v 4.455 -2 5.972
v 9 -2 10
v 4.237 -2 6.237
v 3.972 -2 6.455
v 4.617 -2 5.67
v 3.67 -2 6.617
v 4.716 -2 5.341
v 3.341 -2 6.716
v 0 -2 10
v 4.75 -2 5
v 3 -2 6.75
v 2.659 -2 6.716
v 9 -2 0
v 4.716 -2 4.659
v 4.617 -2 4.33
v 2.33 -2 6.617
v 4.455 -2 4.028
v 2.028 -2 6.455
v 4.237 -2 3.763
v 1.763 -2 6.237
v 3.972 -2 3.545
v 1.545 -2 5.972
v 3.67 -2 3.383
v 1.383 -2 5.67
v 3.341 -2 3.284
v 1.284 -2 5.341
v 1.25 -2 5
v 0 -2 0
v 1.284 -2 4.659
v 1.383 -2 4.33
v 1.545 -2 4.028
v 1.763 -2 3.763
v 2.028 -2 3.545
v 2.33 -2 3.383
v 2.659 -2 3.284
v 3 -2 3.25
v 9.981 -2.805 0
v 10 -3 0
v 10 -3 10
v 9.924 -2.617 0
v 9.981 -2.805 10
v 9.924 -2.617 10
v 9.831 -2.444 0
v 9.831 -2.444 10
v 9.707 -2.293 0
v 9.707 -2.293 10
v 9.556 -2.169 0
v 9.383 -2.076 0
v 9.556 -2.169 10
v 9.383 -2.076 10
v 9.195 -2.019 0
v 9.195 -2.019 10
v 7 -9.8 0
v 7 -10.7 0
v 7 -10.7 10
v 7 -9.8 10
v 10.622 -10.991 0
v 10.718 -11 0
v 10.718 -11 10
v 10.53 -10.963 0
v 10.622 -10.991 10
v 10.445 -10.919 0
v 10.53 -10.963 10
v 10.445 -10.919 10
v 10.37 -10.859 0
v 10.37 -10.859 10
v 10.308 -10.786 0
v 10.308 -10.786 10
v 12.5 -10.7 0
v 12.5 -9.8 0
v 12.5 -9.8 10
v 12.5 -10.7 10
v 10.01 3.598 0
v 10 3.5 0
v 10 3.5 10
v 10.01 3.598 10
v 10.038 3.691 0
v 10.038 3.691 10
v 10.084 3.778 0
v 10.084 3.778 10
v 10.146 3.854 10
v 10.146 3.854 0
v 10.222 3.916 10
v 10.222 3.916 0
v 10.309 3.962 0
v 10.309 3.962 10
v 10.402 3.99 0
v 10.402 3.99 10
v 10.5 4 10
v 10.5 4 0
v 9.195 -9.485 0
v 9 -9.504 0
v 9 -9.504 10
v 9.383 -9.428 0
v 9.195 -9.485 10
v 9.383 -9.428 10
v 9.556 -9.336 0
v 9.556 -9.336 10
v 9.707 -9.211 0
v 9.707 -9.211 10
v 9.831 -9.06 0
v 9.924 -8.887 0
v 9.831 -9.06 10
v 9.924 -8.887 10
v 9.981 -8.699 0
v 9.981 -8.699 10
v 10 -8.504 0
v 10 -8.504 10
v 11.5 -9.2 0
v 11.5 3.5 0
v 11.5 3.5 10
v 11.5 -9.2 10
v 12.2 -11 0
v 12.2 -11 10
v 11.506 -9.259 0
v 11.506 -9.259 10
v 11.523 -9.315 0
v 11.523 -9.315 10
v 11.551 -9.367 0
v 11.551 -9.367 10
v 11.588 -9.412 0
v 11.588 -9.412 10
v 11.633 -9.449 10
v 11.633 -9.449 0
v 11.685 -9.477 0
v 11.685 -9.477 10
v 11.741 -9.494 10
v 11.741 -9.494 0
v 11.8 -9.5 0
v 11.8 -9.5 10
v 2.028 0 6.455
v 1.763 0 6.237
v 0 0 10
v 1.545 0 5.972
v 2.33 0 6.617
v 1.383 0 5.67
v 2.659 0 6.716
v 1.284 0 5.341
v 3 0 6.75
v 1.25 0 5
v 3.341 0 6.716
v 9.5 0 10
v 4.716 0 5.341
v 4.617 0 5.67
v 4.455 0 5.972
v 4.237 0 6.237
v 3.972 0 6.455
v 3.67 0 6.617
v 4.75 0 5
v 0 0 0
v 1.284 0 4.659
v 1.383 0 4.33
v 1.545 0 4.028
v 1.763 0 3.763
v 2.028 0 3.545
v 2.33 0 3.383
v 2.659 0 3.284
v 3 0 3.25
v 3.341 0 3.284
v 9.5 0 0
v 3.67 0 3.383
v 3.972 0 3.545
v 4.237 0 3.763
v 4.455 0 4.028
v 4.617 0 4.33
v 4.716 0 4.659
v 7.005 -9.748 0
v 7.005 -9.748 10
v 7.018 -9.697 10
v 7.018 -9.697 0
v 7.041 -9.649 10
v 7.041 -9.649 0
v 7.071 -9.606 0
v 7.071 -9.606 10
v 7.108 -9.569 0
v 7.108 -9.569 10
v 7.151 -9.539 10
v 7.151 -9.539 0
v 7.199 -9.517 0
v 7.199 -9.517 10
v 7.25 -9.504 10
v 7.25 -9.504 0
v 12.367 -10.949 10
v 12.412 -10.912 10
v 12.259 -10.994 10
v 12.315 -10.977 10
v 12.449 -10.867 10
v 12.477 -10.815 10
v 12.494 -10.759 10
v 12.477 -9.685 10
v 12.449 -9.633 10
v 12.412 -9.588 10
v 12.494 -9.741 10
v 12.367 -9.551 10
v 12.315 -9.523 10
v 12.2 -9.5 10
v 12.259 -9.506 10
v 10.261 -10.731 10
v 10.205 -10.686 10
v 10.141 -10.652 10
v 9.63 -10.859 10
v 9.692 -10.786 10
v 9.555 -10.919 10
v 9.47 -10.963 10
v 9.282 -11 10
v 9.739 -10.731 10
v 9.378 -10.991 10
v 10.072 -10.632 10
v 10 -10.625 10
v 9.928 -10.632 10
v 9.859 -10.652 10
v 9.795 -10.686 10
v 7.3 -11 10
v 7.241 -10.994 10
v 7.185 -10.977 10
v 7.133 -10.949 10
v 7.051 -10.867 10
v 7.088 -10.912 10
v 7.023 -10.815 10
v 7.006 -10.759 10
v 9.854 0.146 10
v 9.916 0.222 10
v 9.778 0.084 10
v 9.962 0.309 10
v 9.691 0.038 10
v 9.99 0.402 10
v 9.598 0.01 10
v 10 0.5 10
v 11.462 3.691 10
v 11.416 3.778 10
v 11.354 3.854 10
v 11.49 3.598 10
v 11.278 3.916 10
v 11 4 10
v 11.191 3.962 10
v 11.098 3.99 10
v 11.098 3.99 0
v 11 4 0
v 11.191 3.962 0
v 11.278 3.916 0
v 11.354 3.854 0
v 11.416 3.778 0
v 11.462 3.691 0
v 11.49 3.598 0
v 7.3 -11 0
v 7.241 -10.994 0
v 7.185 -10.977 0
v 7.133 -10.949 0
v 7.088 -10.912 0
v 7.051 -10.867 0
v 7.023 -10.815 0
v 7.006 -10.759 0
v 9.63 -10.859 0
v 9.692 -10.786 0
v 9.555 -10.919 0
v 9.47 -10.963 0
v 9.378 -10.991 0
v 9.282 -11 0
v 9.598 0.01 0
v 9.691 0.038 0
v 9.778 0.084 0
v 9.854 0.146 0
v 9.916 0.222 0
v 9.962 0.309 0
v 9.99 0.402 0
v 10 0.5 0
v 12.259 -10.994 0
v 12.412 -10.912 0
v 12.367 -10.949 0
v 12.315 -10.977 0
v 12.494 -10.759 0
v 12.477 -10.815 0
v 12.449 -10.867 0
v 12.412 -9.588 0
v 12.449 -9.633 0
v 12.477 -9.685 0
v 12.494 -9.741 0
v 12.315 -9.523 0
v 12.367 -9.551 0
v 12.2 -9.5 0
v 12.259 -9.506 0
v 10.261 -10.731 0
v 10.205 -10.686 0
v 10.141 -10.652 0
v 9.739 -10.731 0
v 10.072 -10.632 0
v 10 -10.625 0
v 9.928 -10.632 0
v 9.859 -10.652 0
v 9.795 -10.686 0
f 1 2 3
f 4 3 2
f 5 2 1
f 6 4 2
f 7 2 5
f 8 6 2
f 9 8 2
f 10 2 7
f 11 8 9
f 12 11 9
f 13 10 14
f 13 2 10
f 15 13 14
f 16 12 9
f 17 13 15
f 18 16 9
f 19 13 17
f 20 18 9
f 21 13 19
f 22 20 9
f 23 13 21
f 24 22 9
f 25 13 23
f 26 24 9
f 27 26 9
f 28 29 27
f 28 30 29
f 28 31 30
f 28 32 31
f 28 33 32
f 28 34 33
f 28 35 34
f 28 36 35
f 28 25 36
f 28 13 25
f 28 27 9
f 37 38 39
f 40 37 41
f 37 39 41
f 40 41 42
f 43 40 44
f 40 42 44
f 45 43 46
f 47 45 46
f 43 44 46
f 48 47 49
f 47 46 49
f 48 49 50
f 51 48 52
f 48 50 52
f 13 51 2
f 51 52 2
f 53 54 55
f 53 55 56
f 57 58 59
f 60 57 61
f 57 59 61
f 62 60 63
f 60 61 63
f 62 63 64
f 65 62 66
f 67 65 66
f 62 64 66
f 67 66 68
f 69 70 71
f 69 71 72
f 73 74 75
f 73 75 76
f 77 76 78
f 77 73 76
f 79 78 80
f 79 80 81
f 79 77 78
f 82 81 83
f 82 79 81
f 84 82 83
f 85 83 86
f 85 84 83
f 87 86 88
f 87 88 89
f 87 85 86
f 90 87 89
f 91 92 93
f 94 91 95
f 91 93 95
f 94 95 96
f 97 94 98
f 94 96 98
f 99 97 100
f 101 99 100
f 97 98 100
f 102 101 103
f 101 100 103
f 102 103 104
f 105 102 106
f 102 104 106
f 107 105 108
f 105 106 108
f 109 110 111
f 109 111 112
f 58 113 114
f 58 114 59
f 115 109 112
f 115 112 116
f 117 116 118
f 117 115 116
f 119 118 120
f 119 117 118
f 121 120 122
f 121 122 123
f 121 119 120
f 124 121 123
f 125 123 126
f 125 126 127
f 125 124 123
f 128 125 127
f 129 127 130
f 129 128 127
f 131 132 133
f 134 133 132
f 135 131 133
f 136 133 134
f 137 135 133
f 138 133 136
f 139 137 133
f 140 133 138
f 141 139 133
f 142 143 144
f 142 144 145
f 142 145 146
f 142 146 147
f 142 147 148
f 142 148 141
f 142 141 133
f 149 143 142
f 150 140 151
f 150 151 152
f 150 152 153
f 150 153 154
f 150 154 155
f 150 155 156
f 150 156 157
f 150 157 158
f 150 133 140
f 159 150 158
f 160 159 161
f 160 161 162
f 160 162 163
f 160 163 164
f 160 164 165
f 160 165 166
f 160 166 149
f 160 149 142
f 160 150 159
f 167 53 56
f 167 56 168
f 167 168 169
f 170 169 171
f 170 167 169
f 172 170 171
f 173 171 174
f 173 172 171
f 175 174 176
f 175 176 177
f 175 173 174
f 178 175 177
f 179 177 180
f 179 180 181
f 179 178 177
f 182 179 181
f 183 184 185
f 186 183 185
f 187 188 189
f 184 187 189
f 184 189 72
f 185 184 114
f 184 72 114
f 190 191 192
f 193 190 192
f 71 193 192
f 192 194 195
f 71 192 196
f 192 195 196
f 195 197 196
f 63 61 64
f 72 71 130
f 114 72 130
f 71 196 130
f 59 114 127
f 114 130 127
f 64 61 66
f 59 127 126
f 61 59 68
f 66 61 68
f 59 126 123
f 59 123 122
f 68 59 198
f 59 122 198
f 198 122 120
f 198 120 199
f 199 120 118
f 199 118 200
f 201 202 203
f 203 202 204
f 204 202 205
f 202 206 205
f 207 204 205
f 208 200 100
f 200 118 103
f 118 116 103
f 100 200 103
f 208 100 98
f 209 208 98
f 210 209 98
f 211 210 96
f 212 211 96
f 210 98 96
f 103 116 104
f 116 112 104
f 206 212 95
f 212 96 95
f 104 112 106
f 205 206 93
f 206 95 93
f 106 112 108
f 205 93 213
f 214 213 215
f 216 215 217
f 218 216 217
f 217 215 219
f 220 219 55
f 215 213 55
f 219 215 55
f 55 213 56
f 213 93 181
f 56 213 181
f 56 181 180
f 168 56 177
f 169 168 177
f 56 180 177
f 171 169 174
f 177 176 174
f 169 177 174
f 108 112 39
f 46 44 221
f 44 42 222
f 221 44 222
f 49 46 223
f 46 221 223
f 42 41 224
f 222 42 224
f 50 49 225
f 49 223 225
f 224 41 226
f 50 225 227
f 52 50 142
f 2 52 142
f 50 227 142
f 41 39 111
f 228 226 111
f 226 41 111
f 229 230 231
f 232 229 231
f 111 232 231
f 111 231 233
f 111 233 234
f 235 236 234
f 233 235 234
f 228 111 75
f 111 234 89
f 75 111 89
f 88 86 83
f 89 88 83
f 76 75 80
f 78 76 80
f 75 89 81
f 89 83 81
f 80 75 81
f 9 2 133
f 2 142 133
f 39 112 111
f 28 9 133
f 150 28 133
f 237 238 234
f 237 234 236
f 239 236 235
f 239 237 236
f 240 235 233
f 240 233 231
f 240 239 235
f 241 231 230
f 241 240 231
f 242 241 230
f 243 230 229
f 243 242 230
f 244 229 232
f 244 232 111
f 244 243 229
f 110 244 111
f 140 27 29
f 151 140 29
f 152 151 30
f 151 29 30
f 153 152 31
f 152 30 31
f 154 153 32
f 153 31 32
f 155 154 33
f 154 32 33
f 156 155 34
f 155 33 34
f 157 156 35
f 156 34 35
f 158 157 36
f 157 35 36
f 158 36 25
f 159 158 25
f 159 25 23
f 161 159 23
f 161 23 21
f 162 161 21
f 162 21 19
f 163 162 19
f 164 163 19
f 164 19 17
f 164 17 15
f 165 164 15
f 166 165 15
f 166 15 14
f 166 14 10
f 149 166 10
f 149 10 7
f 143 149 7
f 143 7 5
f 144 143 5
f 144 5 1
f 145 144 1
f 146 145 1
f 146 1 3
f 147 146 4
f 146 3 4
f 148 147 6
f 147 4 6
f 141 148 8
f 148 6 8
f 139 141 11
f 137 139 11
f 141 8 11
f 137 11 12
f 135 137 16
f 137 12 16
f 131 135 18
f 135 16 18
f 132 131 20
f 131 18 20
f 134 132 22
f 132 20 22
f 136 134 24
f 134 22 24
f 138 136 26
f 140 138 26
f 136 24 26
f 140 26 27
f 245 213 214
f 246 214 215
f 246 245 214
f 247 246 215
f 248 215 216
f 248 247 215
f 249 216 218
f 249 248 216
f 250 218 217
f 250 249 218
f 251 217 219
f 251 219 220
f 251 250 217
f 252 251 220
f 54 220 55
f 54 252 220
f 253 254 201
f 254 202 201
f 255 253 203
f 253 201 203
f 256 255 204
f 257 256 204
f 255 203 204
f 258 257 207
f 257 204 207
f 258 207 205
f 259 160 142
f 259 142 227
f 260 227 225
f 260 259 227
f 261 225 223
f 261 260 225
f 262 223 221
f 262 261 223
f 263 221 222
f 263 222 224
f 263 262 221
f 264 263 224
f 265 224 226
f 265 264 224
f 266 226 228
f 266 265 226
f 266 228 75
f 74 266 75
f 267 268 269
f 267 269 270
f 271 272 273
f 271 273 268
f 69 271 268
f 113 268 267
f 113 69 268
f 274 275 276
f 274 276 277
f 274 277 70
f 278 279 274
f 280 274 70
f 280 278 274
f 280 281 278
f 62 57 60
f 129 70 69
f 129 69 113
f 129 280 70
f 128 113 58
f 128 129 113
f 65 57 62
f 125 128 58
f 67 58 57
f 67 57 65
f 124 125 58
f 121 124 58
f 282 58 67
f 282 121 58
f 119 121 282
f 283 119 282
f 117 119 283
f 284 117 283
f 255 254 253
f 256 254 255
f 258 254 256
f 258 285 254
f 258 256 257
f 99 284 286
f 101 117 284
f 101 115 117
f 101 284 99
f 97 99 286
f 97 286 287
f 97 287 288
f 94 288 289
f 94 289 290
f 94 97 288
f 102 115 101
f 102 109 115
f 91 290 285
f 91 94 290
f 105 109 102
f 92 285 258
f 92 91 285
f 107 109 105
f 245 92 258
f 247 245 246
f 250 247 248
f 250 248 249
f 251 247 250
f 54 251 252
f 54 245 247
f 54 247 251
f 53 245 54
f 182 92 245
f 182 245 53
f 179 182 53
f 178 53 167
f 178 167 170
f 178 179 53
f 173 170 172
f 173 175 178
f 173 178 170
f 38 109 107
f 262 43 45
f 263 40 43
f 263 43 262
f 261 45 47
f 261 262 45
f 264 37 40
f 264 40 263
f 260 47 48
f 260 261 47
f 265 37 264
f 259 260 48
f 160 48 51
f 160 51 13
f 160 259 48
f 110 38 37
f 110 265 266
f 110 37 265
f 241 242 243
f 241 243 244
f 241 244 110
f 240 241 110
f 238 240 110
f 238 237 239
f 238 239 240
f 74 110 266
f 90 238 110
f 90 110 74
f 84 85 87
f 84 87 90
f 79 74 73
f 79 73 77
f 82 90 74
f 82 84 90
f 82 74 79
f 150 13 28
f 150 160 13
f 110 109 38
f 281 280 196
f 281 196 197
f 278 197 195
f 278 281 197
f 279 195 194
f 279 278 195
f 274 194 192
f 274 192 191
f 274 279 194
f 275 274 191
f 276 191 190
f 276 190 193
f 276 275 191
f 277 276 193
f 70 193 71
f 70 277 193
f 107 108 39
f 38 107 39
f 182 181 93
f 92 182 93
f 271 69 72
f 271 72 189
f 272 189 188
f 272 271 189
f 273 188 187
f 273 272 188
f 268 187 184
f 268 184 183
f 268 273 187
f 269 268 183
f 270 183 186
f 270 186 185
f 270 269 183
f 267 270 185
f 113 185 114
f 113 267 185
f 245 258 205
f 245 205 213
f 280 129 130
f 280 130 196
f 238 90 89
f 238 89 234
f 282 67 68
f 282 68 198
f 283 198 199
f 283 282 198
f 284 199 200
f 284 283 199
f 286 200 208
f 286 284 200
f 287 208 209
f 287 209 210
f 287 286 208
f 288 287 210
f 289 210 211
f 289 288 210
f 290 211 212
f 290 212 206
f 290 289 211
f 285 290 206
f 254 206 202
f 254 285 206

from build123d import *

# Parameters (mm, degrees)
BOSS_EXTRUDE1_DEPTH  = 10
FILLET1_R            = 0.5
M3_CLEARANCE_HOLE1_D = 3.5
CUT_EXTRUDE1_DEPTH   = 10


with BuildPart() as part:
    # Sketch1 → Boss-Extrude1 (new body)
    with BuildSketch(Plane.XY):
        with BuildLine():
            Line((0, 0), (9.5, 0))
            ThreePointArc((9.5, 0), (9.853553391, 0.146446609), (10, 0.5))
            Line((10, 0.5), (10, 3.5))
            ThreePointArc((10, 3.5), (10.146446609, 3.853553391), (10.5, 4))
            Line((10.5, 4), (11, 4))
            ThreePointArc((11, 4), (11.353553391, 3.853553391), (11.5, 3.5))
            Line((11.5, 3.5), (11.5, -9.2))
            ThreePointArc((11.5, -9.2), (11.587867966, -9.412132034), (11.8, -9.5))
            Line((11.8, -9.5), (12.2, -9.5))
            ThreePointArc((12.2, -9.5), (12.412132034, -9.587867966), (12.5, -9.8))
            Line((12.5, -9.8), (12.5, -10.7))
            ThreePointArc((12.5, -10.7), (12.412132034, -10.912132034), (12.2, -11))
            Line((12.2, -11), (10.375, -11))
            ThreePointArc((10.375, -11), (10, -10.625), (9.625, -11))
            Line((9.625, -11), (7.3, -11))
            ThreePointArc((7.3, -11), (7.087867966, -10.912132034), (7, -10.7))
            Line((7, -10.7), (7, -9.8))
            ThreePointArc((7, -9.8), (7.070871215, -9.606350833), (7.25, -9.504196011))
            ThreePointArc((7.25, -9.504196011), (7.429128785, -9.402041189), (7.5, -9.208392022))
            Line((7.5, -9.208392022), (7.5, -2.2))
            ThreePointArc((7.5, -2.2), (7.441421356, -2.058578644), (7.3, -2))
            Line((7.3, -2), (0, -2))
            Line((0, -2), (0, 0))
        make_face()
    extrude(amount=BOSS_EXTRUDE1_DEPTH)

    # Fillet1
    fillet1_edges = [part.edges().sort_by_distance(p)[0] for p in [
        (10.375, -11, 5),
        (9.625, -11, 5),
    ]]
    fillet(fillet1_edges, radius=FILLET1_R)

    # M3 Clearance Hole1 (through all)
    with Locations(Plane(origin=(0, 0, 0), x_dir=(1, 0, 0), z_dir=(0, 1, 0))):
        with Locations((3, -5)):
            Hole(M3_CLEARANCE_HOLE1_D / 2)

    # Sketch4 → Cut-Extrude1 (cut)
    with BuildSketch(Plane.XY.offset(10)):
        with BuildLine():
            Line((7.25, -9.504196011), (9, -9.504196011))
            ThreePointArc((9, -9.504196011), (9.707106781, -9.211302792), (10, -8.504196011))
            Line((10, -8.504196011), (10, -3))
            ThreePointArc((10, -3), (9.707106781, -2.292893219), (9, -2))
            Line((9, -2), (7.5, -2))
            Line((7.5, -2), (7.25, -2))
            Line((7.25, -2), (7.25, -9.504196011))
        make_face()
    extrude(amount=-CUT_EXTRUDE1_DEPTH, mode=Mode.SUBTRACT)


solid = part.part
